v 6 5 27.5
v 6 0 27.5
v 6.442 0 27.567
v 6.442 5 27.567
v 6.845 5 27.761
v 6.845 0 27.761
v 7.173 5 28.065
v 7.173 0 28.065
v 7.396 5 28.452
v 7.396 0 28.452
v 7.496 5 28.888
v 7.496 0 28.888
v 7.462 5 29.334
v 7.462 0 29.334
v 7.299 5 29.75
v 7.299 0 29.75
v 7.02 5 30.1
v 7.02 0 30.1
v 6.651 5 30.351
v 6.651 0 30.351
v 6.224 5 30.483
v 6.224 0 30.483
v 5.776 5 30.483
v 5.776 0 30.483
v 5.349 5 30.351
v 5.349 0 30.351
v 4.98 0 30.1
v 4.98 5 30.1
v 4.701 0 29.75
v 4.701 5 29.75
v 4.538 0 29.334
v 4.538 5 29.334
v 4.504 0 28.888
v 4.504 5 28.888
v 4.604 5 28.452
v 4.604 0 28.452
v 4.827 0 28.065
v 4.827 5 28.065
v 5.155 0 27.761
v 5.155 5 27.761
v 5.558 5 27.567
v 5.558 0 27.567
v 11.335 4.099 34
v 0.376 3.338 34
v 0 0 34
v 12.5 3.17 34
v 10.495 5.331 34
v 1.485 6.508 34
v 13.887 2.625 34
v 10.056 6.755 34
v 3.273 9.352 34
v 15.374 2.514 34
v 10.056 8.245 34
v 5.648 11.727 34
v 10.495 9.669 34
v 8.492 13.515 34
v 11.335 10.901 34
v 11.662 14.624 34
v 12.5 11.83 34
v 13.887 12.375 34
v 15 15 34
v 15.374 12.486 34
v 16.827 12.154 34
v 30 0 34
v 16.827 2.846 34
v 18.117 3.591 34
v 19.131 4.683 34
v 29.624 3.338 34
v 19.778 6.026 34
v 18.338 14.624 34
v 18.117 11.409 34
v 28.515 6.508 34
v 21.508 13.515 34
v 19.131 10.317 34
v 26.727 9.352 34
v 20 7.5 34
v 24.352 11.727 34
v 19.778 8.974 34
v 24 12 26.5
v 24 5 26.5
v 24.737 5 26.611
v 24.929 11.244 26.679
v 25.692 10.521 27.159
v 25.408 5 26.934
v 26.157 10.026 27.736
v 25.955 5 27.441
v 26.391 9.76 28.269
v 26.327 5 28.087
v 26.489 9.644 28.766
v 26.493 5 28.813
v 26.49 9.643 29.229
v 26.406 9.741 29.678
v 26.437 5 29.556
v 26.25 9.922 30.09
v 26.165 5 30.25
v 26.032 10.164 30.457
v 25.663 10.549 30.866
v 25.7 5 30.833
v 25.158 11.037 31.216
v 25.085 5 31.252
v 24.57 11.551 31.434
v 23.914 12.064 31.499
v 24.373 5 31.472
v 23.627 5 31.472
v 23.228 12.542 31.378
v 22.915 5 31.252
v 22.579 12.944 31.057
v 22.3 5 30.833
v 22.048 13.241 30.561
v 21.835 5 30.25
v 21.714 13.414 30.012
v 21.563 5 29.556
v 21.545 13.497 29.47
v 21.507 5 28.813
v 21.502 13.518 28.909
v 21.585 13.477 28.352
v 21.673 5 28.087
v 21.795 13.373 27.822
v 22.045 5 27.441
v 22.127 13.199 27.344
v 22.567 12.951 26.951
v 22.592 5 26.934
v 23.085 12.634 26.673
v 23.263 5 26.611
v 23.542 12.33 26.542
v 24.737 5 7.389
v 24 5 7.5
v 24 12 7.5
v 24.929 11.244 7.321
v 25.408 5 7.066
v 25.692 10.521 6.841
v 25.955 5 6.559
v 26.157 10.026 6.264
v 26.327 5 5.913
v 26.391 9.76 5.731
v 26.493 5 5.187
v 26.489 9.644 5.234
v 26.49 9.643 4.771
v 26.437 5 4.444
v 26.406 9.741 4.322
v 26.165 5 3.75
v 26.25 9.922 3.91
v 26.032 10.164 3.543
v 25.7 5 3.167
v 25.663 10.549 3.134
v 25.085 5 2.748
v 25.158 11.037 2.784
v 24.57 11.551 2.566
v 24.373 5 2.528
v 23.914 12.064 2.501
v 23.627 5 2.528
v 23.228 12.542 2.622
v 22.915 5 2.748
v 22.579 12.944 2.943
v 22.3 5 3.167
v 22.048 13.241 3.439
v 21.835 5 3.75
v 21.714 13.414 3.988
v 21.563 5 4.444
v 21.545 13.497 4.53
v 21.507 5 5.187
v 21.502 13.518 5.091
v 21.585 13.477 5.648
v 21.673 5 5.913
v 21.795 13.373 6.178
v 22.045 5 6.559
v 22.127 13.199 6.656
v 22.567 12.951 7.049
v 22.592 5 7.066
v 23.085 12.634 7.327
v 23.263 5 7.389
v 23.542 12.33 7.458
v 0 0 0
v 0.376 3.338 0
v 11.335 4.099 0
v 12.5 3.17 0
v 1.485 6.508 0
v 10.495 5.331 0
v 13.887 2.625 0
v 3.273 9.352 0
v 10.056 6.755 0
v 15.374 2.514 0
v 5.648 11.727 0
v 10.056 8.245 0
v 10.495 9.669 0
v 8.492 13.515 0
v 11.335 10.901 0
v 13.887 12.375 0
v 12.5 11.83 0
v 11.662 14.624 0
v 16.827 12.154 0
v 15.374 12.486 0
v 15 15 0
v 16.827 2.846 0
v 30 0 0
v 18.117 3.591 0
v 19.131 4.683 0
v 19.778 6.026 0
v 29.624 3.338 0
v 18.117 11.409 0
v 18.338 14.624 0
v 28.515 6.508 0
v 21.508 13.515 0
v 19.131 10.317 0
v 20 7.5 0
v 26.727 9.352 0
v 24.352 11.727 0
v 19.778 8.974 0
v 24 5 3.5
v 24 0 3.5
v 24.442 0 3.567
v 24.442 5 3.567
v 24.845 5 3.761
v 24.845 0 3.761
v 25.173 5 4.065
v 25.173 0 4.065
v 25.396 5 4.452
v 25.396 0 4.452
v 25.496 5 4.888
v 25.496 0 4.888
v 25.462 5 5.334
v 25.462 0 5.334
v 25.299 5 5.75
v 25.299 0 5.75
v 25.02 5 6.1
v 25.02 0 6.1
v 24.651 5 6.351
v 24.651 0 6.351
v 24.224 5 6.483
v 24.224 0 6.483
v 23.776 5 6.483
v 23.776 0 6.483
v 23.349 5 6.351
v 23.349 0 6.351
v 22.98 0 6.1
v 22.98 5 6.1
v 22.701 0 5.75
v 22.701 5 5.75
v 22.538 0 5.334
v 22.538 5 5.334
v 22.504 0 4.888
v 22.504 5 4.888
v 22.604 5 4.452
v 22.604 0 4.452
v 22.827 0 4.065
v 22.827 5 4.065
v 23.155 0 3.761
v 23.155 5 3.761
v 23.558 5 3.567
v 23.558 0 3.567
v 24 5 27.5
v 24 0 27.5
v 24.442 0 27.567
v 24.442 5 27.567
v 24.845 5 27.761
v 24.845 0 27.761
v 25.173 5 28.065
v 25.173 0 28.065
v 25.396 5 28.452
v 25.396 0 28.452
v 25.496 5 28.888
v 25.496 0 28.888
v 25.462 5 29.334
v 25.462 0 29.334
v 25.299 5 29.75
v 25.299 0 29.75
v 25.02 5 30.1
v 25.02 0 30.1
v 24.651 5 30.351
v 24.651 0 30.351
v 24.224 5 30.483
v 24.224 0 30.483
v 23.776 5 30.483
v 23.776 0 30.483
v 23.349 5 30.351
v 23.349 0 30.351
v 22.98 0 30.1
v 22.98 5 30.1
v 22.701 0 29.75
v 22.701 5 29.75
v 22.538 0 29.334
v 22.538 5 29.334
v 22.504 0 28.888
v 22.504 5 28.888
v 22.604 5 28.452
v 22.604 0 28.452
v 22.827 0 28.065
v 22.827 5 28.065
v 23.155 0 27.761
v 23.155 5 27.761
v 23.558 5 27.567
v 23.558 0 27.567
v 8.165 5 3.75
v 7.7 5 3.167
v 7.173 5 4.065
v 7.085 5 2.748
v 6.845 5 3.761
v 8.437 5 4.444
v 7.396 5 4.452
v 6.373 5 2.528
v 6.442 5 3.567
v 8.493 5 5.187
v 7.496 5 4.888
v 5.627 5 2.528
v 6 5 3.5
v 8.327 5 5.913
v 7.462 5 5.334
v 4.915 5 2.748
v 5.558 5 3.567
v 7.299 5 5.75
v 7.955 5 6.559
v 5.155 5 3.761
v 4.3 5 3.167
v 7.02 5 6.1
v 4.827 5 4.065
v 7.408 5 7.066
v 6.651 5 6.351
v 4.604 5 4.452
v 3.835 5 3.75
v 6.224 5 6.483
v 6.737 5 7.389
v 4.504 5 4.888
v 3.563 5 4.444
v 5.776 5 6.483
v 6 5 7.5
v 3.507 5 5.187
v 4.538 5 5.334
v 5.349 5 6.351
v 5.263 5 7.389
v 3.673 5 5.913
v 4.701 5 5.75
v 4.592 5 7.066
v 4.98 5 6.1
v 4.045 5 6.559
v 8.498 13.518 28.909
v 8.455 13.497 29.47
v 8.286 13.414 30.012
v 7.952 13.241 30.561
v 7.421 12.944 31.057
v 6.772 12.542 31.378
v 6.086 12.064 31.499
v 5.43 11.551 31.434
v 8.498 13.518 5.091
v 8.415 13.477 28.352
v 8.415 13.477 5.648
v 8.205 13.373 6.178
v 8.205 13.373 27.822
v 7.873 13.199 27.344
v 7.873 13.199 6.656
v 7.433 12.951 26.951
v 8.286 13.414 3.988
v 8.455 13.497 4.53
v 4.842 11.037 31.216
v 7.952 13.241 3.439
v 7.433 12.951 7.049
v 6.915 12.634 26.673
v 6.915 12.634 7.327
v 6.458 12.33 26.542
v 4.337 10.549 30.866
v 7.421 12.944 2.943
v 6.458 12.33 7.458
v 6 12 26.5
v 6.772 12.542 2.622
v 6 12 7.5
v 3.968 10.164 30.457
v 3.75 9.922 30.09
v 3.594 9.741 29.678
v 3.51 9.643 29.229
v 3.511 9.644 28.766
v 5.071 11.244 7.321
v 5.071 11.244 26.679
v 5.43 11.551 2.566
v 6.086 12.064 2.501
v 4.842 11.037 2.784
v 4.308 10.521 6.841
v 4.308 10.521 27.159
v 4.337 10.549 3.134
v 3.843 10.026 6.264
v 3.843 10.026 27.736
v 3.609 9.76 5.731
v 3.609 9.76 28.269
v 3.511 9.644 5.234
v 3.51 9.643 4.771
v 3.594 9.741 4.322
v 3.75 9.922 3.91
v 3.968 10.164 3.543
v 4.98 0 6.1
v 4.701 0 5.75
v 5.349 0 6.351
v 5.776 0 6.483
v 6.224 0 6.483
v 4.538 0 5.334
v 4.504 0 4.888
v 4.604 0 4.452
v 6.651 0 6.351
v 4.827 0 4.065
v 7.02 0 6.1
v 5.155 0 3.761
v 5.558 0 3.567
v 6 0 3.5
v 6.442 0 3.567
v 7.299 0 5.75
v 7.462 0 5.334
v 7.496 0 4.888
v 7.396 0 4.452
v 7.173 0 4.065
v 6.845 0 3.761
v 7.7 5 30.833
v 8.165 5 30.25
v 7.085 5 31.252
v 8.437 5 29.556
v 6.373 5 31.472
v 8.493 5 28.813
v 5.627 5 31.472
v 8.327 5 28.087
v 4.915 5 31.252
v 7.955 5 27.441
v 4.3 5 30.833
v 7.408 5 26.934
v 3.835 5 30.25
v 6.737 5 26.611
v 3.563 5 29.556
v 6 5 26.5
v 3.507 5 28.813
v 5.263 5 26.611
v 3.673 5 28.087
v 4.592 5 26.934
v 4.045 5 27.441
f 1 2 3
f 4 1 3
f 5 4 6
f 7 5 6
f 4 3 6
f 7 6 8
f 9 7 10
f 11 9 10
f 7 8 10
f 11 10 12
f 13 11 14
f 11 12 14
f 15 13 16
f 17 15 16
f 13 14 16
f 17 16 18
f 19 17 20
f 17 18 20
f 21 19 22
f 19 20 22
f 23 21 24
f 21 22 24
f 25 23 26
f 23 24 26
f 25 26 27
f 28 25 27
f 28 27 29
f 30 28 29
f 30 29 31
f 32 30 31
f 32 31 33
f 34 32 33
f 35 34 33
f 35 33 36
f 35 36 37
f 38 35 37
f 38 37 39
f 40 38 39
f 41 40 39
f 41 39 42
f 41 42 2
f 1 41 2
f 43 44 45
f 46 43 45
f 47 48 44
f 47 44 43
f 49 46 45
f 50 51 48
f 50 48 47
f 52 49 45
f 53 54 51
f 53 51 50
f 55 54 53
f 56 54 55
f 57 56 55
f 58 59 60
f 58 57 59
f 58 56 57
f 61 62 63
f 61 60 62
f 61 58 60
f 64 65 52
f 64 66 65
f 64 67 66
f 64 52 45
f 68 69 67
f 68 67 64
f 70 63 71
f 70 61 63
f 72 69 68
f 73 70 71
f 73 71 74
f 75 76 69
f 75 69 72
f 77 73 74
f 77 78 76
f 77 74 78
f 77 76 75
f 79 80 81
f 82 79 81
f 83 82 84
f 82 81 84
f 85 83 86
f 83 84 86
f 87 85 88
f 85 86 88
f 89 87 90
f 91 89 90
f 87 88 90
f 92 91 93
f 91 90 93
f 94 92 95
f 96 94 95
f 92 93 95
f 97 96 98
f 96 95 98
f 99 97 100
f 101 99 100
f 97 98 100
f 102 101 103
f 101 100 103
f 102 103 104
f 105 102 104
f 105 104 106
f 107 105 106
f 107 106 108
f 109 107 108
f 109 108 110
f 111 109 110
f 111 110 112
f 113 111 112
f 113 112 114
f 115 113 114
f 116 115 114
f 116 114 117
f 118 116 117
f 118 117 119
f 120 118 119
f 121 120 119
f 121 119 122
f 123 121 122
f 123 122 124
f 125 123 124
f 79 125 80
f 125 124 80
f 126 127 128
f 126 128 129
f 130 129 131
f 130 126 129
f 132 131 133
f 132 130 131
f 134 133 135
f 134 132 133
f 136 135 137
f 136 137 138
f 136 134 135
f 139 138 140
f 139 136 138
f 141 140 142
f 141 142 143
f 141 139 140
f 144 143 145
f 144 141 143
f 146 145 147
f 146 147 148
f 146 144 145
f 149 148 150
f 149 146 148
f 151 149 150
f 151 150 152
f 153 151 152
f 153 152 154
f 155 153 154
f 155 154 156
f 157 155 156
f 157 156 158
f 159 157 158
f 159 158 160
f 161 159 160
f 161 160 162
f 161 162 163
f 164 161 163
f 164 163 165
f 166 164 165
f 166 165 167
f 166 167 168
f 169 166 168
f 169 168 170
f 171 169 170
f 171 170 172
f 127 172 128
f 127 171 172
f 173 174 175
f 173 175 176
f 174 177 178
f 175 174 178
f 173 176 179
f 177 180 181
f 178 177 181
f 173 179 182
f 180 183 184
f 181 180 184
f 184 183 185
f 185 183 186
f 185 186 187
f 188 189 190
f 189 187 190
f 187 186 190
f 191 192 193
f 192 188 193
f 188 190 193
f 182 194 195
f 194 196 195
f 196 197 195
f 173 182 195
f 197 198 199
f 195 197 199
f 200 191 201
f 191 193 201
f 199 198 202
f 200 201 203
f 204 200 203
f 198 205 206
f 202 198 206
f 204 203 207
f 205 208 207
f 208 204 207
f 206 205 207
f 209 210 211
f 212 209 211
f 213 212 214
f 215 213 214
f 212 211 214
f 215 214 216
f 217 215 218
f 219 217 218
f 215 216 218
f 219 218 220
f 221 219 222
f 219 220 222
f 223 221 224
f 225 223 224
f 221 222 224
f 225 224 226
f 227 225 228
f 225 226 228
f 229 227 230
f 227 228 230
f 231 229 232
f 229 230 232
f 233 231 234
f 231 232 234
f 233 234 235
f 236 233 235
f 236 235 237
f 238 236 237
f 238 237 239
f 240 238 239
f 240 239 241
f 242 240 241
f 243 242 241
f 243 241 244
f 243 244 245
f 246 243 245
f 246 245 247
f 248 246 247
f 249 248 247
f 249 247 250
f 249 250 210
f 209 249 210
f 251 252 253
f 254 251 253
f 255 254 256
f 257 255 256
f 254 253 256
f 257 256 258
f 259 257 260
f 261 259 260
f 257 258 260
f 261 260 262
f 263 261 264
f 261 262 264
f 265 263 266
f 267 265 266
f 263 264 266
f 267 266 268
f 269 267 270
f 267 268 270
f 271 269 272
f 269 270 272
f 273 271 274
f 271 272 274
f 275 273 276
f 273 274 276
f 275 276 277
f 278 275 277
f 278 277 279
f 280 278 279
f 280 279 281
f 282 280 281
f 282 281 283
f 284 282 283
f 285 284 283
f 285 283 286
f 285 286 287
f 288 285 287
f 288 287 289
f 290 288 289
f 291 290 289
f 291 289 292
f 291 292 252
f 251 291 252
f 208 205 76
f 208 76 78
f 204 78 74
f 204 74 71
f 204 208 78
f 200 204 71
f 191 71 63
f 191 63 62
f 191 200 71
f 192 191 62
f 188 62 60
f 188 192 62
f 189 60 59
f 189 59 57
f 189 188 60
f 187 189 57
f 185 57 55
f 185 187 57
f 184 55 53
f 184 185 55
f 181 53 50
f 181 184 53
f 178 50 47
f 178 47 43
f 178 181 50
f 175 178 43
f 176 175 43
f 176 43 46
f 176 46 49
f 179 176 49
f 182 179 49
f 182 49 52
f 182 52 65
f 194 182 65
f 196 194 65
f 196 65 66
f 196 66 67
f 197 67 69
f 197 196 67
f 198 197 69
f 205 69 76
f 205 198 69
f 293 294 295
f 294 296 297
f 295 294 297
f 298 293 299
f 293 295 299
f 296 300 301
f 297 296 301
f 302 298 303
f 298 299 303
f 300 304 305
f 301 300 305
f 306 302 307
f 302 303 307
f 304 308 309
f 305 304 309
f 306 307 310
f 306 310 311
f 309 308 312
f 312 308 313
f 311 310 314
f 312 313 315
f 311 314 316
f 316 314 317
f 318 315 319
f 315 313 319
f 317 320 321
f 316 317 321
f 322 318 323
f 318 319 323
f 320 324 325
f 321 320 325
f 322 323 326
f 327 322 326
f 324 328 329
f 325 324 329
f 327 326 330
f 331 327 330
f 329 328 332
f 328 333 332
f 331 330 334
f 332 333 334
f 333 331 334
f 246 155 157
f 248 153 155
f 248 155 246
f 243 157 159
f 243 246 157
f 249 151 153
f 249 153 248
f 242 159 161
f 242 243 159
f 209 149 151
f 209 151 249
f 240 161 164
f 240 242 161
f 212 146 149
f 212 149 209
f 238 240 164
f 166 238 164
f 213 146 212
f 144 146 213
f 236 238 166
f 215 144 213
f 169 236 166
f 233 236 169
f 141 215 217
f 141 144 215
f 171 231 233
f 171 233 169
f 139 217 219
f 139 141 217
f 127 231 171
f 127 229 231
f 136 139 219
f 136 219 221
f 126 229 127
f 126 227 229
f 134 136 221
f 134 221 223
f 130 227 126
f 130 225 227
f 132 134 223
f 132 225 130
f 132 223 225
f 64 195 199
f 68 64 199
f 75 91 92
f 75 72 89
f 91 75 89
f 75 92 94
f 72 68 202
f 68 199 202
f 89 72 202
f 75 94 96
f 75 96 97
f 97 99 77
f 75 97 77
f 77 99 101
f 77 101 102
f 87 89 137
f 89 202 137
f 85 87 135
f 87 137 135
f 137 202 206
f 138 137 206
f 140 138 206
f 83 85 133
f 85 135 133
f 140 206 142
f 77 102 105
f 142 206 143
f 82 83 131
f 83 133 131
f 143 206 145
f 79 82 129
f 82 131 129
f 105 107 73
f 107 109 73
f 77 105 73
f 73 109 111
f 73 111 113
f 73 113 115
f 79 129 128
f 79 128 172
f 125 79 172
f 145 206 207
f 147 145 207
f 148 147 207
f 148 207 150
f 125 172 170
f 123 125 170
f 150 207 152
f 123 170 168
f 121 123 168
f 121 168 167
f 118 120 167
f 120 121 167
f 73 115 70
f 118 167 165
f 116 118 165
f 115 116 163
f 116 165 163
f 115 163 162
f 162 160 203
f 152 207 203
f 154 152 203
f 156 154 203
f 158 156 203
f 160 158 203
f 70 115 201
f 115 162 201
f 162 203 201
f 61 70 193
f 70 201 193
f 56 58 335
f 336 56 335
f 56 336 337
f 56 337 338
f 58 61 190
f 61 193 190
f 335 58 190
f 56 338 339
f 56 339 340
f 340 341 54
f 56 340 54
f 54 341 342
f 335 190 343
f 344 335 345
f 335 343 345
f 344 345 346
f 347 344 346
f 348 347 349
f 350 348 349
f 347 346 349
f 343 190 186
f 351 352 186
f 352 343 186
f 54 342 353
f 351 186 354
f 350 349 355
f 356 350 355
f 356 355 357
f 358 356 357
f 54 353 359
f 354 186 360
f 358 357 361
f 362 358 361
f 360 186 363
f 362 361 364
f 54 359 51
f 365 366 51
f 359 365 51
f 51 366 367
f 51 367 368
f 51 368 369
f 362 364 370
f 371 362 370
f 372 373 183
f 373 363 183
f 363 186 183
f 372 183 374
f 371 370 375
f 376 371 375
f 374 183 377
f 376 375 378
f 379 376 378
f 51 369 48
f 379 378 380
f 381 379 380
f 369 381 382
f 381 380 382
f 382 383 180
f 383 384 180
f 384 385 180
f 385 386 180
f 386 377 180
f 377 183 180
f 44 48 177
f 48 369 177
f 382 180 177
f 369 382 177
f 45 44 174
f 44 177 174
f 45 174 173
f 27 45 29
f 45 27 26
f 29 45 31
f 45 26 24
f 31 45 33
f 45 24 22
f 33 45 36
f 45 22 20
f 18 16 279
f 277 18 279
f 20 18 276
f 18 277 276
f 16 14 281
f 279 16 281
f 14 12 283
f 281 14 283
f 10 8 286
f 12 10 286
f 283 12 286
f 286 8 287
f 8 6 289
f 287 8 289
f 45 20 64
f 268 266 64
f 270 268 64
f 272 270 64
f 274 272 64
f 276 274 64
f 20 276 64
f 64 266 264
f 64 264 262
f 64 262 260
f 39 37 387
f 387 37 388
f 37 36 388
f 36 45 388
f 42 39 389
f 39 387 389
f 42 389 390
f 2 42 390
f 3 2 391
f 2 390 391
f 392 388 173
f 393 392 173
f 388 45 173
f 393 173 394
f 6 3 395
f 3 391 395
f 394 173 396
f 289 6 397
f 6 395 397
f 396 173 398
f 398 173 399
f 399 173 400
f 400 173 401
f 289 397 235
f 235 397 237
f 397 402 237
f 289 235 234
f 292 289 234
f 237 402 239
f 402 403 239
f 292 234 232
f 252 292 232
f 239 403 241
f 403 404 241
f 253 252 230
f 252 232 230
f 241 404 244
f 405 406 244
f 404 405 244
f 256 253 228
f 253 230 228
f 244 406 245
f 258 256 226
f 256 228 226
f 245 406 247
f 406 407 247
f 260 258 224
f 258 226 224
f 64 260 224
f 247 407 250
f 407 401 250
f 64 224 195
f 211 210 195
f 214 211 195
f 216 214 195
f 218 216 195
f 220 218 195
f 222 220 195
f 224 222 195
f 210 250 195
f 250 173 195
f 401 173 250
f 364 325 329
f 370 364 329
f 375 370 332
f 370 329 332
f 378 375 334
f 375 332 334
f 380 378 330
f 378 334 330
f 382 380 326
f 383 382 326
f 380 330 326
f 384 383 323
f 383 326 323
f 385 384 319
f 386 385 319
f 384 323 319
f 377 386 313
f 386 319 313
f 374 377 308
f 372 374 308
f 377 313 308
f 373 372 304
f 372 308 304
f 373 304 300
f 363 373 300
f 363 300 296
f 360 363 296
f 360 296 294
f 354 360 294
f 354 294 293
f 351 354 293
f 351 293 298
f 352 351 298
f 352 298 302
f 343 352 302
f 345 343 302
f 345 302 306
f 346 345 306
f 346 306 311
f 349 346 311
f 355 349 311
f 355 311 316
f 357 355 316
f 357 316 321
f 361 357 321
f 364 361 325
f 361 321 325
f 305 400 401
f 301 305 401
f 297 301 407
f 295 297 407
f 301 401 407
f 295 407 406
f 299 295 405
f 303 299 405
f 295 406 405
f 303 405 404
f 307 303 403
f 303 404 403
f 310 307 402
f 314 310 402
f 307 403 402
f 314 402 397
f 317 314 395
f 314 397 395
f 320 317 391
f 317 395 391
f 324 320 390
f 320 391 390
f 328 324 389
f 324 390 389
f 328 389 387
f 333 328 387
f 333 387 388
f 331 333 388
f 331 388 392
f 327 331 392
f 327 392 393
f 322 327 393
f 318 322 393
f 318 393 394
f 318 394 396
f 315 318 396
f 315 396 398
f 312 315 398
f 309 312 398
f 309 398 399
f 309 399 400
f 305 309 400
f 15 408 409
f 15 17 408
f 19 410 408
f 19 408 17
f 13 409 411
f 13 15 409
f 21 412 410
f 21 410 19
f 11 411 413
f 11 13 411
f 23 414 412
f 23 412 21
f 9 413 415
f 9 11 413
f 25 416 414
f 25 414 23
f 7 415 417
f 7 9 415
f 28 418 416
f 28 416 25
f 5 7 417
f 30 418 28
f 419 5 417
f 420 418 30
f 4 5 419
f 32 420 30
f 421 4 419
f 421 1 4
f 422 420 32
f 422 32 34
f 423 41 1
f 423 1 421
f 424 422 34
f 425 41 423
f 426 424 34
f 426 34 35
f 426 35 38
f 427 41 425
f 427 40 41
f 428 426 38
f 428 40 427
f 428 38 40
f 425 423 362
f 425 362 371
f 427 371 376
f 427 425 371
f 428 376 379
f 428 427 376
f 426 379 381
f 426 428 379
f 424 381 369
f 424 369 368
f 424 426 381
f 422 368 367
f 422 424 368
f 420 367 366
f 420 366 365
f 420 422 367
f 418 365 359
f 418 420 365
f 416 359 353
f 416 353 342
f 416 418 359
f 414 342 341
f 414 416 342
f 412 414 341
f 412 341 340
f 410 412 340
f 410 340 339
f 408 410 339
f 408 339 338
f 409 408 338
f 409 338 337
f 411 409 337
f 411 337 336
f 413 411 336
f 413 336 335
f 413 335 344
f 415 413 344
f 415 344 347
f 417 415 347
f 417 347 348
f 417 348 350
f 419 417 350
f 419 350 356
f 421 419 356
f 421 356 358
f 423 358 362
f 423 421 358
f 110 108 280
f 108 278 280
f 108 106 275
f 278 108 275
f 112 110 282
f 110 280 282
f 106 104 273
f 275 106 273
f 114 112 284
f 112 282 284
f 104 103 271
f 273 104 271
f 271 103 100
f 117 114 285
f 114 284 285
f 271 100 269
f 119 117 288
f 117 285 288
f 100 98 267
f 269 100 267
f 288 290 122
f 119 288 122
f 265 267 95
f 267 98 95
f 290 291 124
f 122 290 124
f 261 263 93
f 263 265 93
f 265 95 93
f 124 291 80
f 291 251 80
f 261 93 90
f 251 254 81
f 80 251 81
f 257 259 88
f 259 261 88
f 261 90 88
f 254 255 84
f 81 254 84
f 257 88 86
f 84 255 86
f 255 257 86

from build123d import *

# Parameters (mm, degrees)
ESQUISSE1_R               = 5
BOSS_EXTRU_1_DEPTH        = 34
ESQUISSE2_R               = 1.5
ENL_V_MAT_EXTRU_1_DEPTH   = 48.759815745
ENL_V_START               = -5
ESQUISSE4_R               = 2.5
ENL_V_MAT_EXTRU_2_DEPTH   = 43.75981591
SYM_TRIE2_START           = -5
SYM_TRIE2_COPY_1_SKETCH_R = 2.5
SYM_TRIE2_COPY_1_DEPTH    = 43.75981591


with BuildPart() as part:
    # Esquisse1 → Boss.-Extru.1 (new body)
    with BuildSketch(Plane.XY):
        with BuildLine():
            Line((0, 0), (30, 0))
            ThreePointArc((30, 0), (15, 15), (0, 0))
        make_face()
        with Locations((15, 7.5)):
            Circle(ESQUISSE1_R, mode=Mode.SUBTRACT)
    extrude(amount=BOSS_EXTRU_1_DEPTH)

    # Esquisse2 → Enlèv. mat.-Extru.1 (cut, through all)
    with BuildSketch(Plane.XZ):
        with Locations(Location((24, 29, 0), (0, 0, 270))):
            Circle(ESQUISSE2_R)
        with Locations(Location((24, 5, 0), (0, 0, 270))):
            Circle(ESQUISSE2_R)
        with Locations(Location((6, 5, 0), (0, 0, 270))):
            Circle(ESQUISSE2_R)
        with Locations(Location((6, 29, 0), (0, 0, 270))):
            Circle(ESQUISSE2_R)
    extrude(amount=-ENL_V_MAT_EXTRU_1_DEPTH, mode=Mode.SUBTRACT)

    # Esquisse4 → Enlèv. mat.-Extru.2 (cut, through all)
    with BuildSketch(Plane.XZ.offset(ENL_V_START)):
        with Locations(Location((24, 29, 0), (0, 0, 270))):
            Circle(ESQUISSE4_R)
    enl_v_mat_extru_2 = extrude(amount=-ENL_V_MAT_EXTRU_2_DEPTH, mode=Mode.SUBTRACT)

    # Symétrie1: Enlèv. mat.-Extru.2 across plane
    add(enl_v_mat_extru_2.mirror(Plane(origin=(15, 0, 0), x_dir=(0, 0, 1), z_dir=(1, 0, 0))), mode=Mode.SUBTRACT)

    # Symétrie2: Enlèv. mat.-Extru.2 across plane
    add(enl_v_mat_extru_2.mirror(Plane.XY.offset(17)), mode=Mode.SUBTRACT)

    # Symétrie2 copy 1 sketch → Symétrie2 copy 1 (cut, through all)
    with BuildSketch(Plane(origin=(30, 0, 34), x_dir=(-1, 0, 0), z_dir=(0, -1, 0)).offset(SYM_TRIE2_START)):
        with Locations(Location((24, 29, 0), (0, 0, 270))):
            Circle(SYM_TRIE2_COPY_1_SKETCH_R)
    extrude(amount=-SYM_TRIE2_COPY_1_DEPTH, mode=Mode.SUBTRACT)


solid = part.part
